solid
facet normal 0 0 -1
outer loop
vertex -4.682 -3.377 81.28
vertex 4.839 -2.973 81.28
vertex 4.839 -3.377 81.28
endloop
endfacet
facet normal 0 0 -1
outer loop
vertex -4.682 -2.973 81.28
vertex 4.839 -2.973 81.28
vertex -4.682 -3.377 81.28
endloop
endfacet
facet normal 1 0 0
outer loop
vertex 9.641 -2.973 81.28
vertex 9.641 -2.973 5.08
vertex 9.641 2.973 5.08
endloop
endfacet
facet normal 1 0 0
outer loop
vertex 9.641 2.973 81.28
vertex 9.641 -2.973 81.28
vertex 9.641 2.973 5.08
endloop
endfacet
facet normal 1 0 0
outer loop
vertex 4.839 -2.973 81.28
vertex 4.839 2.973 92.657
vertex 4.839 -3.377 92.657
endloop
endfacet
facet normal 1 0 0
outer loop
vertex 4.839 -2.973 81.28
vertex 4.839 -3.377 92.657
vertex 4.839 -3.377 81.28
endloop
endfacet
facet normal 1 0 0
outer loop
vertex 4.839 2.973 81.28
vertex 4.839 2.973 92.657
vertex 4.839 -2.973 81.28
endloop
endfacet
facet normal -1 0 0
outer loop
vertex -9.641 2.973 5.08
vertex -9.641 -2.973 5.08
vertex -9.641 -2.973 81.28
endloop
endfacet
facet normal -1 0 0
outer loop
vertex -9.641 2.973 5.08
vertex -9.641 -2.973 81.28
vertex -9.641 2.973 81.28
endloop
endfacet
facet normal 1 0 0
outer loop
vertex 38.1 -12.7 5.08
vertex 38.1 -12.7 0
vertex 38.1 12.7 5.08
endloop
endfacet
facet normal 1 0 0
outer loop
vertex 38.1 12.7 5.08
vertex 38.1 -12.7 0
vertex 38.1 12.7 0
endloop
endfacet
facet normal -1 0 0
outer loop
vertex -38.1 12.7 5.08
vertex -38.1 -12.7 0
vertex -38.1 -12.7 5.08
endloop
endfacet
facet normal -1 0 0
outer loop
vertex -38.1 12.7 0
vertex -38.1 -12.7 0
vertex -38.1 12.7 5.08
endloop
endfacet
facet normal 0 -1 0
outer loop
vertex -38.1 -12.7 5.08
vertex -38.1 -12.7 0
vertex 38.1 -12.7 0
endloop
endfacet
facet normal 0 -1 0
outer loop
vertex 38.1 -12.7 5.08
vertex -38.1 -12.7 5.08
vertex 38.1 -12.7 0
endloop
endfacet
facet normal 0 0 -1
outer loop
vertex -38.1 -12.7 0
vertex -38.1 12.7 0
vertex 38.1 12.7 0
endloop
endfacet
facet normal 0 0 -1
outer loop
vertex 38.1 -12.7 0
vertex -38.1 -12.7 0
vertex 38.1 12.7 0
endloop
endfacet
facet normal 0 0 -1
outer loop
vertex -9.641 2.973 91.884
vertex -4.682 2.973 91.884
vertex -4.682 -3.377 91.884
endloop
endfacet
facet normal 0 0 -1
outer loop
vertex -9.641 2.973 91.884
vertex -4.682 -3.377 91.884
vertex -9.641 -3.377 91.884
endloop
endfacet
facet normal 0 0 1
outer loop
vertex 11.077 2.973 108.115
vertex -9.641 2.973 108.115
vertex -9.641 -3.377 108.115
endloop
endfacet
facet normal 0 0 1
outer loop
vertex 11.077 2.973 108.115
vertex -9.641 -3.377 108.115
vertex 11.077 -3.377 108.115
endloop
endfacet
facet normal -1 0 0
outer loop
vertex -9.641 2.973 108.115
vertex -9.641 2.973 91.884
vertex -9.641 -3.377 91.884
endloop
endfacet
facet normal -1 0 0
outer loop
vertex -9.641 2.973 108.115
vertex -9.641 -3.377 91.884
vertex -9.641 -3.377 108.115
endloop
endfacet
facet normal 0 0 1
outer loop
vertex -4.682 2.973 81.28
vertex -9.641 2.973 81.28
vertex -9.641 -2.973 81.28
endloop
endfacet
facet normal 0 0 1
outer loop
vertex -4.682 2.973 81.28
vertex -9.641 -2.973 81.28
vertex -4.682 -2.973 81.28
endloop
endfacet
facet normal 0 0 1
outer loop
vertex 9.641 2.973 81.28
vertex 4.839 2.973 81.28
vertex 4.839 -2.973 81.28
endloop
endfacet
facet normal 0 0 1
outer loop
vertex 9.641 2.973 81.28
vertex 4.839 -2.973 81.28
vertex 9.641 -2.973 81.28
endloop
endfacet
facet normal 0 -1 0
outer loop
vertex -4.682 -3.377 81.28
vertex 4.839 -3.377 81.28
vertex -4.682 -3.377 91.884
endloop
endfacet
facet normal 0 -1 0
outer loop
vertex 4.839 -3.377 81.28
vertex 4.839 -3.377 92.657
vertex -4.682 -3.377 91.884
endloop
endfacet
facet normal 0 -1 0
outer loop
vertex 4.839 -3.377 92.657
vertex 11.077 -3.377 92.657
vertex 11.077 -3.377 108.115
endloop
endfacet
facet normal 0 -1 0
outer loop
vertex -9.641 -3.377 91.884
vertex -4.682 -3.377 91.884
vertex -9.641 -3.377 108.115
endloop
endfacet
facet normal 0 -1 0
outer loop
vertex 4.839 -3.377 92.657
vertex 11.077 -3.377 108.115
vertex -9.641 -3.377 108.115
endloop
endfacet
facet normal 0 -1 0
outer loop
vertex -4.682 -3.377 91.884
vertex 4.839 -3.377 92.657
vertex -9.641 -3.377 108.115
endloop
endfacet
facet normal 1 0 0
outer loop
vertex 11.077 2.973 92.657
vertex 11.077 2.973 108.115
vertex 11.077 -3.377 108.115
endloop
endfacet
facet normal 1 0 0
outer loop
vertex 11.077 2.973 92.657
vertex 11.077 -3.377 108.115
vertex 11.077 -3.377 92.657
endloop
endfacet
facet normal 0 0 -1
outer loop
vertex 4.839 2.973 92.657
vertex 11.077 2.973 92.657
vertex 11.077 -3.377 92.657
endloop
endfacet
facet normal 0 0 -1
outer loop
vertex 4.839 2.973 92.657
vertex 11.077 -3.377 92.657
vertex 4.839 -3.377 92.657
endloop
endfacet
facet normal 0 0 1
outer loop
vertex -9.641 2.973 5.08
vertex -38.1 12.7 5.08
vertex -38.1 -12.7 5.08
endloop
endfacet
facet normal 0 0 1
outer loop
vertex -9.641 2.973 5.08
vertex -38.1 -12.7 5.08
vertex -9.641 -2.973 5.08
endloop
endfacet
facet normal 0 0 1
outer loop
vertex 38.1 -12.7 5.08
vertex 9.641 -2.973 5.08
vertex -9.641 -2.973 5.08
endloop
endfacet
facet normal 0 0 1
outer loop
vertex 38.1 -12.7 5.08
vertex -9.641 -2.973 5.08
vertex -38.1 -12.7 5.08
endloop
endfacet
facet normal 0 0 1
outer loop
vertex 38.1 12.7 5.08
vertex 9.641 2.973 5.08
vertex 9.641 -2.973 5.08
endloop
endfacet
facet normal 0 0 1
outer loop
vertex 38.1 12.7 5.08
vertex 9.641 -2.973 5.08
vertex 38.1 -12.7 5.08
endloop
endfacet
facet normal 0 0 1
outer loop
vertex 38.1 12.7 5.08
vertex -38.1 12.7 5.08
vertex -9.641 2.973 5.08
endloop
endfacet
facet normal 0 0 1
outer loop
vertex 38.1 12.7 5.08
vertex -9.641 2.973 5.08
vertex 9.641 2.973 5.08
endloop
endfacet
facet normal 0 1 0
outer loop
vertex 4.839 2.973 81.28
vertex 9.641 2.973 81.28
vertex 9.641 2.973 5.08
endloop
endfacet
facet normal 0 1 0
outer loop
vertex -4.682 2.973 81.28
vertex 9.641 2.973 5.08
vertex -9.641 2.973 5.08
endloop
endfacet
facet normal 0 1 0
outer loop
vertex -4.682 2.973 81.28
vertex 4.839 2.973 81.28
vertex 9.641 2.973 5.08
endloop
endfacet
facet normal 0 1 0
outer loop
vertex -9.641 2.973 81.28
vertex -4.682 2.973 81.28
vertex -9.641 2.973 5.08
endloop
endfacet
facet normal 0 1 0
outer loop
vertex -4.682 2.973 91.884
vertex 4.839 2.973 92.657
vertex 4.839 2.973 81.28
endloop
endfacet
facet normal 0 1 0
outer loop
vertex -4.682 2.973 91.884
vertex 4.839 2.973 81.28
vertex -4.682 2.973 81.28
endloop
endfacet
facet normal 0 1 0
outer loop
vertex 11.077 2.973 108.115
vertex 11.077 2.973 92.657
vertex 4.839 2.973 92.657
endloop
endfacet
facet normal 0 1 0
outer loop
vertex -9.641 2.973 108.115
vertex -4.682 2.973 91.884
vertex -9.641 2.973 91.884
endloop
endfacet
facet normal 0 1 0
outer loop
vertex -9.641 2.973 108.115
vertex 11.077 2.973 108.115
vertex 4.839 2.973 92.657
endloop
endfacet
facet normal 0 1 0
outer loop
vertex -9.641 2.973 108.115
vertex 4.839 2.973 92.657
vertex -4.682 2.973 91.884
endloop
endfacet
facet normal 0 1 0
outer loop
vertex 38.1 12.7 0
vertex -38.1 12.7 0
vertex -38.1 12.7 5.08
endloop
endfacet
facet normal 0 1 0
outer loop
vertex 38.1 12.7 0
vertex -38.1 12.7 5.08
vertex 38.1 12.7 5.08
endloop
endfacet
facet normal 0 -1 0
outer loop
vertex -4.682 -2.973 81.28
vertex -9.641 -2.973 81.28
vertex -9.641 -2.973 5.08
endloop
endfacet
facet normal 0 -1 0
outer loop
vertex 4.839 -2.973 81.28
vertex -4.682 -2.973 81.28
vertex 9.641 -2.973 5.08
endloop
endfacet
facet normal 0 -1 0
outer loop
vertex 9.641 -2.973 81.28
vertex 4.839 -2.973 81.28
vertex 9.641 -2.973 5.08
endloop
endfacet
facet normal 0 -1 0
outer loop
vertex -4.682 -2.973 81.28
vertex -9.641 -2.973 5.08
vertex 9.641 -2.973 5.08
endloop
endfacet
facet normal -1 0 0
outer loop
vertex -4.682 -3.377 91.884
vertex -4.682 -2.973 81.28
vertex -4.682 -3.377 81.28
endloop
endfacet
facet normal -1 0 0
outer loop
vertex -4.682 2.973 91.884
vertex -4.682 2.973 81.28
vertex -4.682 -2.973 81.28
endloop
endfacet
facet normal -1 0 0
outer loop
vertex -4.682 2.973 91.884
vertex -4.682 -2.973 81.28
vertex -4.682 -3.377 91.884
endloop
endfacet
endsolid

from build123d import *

# Parameters (mm, degrees)
F0_W     = 76.2
F0_H     = 25.4
F1_DEPTH = 5.08
F2_W     = 19.28169
F2_H     = 5.94669
F3_DEPTH = 76.2
F5_DEPTH = 6.35


with BuildPart() as f1:
    # F0 (on Top) → F1 (new body)
    with BuildSketch(Plane.XY):
        Rectangle(F0_W, F0_H)
    extrude(amount=F1_DEPTH)

    # F2 (on face) → F3 (join)
    with BuildSketch(Plane.XY.offset(5.08)):
        Rectangle(F2_W, F2_H)
    extrude(amount=F3_DEPTH)

    # F4 (on face) → F5 (join)
    with BuildSketch(Plane(origin=(0, 2.973345, 0), x_dir=(-1, 0, 0), z_dir=(0, 1, 0))):
        Polygon((-4.838744, 81.28), (4.681972, 81.28), (4.681972, 91.884151), (9.640845, 91.884151), (9.640845, 108.11457), (-11.076658, 108.11457), (-11.076658, 92.657104), (-4.838744, 92.657104), align=None)
    extrude(amount=-F5_DEPTH)


solid = f1.part
